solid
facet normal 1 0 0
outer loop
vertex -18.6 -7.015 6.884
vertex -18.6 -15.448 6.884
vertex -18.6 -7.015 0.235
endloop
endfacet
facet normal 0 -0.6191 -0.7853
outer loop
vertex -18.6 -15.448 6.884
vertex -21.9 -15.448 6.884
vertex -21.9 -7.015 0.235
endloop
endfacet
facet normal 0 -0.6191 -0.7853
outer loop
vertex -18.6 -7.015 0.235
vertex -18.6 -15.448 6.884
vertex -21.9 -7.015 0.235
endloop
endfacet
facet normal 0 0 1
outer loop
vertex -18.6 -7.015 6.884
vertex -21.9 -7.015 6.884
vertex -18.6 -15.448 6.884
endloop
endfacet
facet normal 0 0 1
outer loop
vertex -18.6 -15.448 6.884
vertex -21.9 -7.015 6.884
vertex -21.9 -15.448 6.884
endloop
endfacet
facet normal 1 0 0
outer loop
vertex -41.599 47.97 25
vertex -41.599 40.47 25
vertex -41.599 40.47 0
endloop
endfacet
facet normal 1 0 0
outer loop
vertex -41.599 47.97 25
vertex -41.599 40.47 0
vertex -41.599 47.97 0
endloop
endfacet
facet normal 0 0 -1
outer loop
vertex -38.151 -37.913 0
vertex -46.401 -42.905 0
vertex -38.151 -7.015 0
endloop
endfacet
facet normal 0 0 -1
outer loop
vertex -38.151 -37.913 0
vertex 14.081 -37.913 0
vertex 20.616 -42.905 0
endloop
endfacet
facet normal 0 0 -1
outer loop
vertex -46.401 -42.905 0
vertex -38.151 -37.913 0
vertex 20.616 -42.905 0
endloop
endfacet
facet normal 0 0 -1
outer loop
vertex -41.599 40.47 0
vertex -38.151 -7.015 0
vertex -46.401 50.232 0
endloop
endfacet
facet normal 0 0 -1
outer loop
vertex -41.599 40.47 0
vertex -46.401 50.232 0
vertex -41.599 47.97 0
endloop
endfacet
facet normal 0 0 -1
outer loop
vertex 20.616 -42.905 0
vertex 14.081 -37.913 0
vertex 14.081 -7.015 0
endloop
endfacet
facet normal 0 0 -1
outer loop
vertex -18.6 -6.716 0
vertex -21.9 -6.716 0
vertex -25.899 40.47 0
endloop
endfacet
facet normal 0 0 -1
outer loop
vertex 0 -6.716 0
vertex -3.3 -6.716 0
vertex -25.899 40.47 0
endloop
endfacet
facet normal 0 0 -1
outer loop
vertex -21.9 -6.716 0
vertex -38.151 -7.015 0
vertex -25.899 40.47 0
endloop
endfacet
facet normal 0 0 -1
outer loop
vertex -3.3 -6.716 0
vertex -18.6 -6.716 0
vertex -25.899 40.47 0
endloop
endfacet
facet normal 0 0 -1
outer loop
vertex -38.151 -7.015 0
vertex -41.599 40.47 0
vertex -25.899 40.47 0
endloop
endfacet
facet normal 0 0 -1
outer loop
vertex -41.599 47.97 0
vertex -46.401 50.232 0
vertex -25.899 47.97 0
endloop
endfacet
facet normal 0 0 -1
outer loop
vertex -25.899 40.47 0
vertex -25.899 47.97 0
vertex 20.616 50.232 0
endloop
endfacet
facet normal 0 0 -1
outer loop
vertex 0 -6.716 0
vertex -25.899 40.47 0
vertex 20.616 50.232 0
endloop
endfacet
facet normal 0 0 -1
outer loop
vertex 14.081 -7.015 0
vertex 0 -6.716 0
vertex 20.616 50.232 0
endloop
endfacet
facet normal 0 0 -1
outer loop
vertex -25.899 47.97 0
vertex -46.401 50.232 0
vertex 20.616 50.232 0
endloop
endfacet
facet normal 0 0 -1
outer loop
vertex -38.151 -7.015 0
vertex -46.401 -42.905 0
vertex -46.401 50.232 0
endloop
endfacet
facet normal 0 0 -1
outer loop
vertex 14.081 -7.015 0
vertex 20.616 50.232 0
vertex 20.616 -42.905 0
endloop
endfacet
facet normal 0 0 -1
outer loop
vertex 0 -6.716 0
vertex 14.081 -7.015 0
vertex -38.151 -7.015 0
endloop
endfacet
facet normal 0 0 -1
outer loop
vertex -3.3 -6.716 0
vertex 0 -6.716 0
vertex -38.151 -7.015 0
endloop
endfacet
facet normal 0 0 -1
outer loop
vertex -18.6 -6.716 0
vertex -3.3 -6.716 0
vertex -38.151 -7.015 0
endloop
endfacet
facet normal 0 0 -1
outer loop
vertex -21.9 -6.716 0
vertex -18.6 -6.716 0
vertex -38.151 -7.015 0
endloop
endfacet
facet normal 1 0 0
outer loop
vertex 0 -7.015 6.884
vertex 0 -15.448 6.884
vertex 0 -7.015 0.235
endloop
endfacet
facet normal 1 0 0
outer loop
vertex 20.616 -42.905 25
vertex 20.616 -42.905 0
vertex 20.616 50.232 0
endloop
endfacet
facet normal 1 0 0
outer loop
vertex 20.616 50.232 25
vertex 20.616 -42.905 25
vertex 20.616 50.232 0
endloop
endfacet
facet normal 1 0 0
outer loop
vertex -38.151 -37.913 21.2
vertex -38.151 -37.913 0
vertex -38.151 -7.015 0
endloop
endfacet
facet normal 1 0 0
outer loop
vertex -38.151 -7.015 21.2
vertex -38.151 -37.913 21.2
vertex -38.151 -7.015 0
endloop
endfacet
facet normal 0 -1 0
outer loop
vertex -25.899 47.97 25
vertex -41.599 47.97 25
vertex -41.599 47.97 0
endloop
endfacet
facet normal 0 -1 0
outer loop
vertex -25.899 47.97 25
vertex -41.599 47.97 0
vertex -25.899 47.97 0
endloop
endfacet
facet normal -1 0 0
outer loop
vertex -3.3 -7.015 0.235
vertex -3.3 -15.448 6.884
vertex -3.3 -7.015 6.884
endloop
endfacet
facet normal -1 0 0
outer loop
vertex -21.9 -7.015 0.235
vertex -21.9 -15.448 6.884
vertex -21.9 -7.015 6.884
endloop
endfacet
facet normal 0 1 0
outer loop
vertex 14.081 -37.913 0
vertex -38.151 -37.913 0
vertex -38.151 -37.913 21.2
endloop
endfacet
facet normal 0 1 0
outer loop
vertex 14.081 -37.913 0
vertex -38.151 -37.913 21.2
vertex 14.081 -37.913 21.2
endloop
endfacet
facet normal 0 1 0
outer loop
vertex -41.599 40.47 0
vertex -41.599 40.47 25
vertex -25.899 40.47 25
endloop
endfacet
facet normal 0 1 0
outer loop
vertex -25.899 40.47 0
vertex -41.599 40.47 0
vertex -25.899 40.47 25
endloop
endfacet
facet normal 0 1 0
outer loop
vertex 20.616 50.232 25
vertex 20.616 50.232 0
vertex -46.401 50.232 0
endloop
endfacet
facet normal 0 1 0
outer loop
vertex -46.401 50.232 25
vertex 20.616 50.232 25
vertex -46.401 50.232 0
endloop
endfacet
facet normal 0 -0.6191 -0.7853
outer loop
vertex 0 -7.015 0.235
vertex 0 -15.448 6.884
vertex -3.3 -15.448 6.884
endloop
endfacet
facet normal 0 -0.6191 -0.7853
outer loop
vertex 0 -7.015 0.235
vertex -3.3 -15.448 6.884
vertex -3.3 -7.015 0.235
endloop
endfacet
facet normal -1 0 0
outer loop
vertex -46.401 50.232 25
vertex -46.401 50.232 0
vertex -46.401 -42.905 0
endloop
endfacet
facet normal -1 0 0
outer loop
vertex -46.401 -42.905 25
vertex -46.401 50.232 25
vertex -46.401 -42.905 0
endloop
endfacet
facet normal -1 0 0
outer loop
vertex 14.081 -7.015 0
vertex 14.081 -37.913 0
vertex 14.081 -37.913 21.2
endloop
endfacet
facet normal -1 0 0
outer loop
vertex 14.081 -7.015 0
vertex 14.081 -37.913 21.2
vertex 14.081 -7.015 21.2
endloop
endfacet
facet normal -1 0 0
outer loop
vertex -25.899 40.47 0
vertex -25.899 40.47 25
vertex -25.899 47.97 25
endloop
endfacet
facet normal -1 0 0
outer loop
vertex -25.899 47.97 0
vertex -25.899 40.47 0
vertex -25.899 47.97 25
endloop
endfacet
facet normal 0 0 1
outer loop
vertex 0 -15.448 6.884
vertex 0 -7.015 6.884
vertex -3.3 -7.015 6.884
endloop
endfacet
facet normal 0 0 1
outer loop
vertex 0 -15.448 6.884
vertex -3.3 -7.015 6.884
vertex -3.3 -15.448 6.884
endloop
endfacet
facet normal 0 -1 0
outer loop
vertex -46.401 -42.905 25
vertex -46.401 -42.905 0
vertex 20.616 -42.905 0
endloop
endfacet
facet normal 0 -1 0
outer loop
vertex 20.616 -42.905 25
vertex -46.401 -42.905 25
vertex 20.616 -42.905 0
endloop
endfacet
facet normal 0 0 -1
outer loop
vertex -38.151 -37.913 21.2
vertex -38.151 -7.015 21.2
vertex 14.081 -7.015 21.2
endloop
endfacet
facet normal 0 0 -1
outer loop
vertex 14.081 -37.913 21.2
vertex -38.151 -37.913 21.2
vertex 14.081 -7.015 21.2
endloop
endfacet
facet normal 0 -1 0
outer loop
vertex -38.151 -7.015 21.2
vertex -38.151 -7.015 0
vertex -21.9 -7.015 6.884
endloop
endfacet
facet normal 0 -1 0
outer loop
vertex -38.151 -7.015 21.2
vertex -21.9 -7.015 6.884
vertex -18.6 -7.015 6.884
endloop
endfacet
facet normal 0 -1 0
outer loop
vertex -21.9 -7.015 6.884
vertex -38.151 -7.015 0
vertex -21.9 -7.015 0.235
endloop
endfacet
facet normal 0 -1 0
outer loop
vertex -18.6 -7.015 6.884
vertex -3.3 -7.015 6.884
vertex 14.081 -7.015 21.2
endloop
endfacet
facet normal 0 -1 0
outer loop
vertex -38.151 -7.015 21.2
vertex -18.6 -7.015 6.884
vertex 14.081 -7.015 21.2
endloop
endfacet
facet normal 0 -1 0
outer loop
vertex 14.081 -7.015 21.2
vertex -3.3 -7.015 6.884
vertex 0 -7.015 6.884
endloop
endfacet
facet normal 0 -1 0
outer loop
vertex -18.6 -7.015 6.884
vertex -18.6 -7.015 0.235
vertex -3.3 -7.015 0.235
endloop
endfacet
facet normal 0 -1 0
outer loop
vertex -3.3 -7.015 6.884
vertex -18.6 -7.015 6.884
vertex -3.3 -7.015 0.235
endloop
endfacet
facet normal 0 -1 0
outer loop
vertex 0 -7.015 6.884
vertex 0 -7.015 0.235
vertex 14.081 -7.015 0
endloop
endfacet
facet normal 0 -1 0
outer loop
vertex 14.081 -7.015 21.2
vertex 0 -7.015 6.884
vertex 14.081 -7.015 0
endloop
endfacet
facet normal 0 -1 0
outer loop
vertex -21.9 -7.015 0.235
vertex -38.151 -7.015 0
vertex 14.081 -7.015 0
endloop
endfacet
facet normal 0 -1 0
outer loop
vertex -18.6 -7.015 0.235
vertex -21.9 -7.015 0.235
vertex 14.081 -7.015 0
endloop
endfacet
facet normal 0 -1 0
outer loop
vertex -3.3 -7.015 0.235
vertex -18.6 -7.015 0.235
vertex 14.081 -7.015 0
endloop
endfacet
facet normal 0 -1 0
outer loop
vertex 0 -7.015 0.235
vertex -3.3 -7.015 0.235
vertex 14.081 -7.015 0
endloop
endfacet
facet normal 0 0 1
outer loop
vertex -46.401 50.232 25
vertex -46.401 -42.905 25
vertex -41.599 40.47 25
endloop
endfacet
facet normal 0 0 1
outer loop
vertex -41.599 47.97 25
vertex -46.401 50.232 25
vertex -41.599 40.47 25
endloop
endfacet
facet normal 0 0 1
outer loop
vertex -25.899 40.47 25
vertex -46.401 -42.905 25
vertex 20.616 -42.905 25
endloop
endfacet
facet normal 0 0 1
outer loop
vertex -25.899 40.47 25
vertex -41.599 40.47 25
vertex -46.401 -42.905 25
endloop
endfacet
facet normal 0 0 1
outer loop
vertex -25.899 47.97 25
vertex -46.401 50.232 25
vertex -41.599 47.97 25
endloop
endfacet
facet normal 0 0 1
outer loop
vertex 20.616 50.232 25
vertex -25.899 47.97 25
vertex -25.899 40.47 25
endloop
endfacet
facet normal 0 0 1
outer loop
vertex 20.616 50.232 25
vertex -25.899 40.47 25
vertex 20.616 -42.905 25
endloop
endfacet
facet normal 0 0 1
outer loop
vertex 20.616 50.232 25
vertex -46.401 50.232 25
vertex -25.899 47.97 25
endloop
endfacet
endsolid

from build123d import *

# Parameters (mm, degrees)
F2_DEPTH  = 25
F1_W      = 15.7
F1_H      = 7.5
F3_DEPTH  = 73
F4_W      = 52.232783
F4_H      = 30.898266
F5_DEPTH  = 21.2
F7_DEPTH  = 3.3
F10_DEPTH = 3.3


with BuildPart() as f2:
    # F0 (on Top) → F2 (new body)
    with BuildSketch(Plane.XY):
        Polygon((20.616367, 50.231609), (-46.400759, 50.231609), (-46.400759, -3.551471), (20.616367, -3.860294), align=None)
        Polygon((20.616367, -3.860294), (-46.400759, -3.551471), (-46.400759, -42.905014), (20.616367, -42.905014), align=None)
    extrude(amount=F2_DEPTH)

    # F1 (on Top) → F3 (cut)
    with BuildSketch(Plane.XY):
        with Locations((-33.749492, 44.219783)):
            Rectangle(F1_W, F1_H)
    extrude(amount=F3_DEPTH, mode=Mode.SUBTRACT)

    # F4 (on Top) → F5 (cut)
    with BuildSketch(Plane.XY):
        with Locations((-12.035032, -22.46394)):
            Rectangle(F4_W, F4_H)
    extrude(amount=F5_DEPTH, mode=Mode.SUBTRACT)

    # F6 (on Right) → F7 (join)
    with BuildSketch(Plane.YZ):
        Polygon((-15.447762, 6.884329), (-6.716418, 0), (-6.716418, 6.884329), align=None)
    extrude(amount=-F7_DEPTH)

    # F9 (on offset) → F10 (join)
    with BuildSketch(Plane.YZ.offset(-21.9)):
        Polygon((-15.447762, 6.884329), (-6.716418, 0), (-6.716418, 6.884329), align=None)
    extrude(amount=F10_DEPTH)


solid = f2.part
